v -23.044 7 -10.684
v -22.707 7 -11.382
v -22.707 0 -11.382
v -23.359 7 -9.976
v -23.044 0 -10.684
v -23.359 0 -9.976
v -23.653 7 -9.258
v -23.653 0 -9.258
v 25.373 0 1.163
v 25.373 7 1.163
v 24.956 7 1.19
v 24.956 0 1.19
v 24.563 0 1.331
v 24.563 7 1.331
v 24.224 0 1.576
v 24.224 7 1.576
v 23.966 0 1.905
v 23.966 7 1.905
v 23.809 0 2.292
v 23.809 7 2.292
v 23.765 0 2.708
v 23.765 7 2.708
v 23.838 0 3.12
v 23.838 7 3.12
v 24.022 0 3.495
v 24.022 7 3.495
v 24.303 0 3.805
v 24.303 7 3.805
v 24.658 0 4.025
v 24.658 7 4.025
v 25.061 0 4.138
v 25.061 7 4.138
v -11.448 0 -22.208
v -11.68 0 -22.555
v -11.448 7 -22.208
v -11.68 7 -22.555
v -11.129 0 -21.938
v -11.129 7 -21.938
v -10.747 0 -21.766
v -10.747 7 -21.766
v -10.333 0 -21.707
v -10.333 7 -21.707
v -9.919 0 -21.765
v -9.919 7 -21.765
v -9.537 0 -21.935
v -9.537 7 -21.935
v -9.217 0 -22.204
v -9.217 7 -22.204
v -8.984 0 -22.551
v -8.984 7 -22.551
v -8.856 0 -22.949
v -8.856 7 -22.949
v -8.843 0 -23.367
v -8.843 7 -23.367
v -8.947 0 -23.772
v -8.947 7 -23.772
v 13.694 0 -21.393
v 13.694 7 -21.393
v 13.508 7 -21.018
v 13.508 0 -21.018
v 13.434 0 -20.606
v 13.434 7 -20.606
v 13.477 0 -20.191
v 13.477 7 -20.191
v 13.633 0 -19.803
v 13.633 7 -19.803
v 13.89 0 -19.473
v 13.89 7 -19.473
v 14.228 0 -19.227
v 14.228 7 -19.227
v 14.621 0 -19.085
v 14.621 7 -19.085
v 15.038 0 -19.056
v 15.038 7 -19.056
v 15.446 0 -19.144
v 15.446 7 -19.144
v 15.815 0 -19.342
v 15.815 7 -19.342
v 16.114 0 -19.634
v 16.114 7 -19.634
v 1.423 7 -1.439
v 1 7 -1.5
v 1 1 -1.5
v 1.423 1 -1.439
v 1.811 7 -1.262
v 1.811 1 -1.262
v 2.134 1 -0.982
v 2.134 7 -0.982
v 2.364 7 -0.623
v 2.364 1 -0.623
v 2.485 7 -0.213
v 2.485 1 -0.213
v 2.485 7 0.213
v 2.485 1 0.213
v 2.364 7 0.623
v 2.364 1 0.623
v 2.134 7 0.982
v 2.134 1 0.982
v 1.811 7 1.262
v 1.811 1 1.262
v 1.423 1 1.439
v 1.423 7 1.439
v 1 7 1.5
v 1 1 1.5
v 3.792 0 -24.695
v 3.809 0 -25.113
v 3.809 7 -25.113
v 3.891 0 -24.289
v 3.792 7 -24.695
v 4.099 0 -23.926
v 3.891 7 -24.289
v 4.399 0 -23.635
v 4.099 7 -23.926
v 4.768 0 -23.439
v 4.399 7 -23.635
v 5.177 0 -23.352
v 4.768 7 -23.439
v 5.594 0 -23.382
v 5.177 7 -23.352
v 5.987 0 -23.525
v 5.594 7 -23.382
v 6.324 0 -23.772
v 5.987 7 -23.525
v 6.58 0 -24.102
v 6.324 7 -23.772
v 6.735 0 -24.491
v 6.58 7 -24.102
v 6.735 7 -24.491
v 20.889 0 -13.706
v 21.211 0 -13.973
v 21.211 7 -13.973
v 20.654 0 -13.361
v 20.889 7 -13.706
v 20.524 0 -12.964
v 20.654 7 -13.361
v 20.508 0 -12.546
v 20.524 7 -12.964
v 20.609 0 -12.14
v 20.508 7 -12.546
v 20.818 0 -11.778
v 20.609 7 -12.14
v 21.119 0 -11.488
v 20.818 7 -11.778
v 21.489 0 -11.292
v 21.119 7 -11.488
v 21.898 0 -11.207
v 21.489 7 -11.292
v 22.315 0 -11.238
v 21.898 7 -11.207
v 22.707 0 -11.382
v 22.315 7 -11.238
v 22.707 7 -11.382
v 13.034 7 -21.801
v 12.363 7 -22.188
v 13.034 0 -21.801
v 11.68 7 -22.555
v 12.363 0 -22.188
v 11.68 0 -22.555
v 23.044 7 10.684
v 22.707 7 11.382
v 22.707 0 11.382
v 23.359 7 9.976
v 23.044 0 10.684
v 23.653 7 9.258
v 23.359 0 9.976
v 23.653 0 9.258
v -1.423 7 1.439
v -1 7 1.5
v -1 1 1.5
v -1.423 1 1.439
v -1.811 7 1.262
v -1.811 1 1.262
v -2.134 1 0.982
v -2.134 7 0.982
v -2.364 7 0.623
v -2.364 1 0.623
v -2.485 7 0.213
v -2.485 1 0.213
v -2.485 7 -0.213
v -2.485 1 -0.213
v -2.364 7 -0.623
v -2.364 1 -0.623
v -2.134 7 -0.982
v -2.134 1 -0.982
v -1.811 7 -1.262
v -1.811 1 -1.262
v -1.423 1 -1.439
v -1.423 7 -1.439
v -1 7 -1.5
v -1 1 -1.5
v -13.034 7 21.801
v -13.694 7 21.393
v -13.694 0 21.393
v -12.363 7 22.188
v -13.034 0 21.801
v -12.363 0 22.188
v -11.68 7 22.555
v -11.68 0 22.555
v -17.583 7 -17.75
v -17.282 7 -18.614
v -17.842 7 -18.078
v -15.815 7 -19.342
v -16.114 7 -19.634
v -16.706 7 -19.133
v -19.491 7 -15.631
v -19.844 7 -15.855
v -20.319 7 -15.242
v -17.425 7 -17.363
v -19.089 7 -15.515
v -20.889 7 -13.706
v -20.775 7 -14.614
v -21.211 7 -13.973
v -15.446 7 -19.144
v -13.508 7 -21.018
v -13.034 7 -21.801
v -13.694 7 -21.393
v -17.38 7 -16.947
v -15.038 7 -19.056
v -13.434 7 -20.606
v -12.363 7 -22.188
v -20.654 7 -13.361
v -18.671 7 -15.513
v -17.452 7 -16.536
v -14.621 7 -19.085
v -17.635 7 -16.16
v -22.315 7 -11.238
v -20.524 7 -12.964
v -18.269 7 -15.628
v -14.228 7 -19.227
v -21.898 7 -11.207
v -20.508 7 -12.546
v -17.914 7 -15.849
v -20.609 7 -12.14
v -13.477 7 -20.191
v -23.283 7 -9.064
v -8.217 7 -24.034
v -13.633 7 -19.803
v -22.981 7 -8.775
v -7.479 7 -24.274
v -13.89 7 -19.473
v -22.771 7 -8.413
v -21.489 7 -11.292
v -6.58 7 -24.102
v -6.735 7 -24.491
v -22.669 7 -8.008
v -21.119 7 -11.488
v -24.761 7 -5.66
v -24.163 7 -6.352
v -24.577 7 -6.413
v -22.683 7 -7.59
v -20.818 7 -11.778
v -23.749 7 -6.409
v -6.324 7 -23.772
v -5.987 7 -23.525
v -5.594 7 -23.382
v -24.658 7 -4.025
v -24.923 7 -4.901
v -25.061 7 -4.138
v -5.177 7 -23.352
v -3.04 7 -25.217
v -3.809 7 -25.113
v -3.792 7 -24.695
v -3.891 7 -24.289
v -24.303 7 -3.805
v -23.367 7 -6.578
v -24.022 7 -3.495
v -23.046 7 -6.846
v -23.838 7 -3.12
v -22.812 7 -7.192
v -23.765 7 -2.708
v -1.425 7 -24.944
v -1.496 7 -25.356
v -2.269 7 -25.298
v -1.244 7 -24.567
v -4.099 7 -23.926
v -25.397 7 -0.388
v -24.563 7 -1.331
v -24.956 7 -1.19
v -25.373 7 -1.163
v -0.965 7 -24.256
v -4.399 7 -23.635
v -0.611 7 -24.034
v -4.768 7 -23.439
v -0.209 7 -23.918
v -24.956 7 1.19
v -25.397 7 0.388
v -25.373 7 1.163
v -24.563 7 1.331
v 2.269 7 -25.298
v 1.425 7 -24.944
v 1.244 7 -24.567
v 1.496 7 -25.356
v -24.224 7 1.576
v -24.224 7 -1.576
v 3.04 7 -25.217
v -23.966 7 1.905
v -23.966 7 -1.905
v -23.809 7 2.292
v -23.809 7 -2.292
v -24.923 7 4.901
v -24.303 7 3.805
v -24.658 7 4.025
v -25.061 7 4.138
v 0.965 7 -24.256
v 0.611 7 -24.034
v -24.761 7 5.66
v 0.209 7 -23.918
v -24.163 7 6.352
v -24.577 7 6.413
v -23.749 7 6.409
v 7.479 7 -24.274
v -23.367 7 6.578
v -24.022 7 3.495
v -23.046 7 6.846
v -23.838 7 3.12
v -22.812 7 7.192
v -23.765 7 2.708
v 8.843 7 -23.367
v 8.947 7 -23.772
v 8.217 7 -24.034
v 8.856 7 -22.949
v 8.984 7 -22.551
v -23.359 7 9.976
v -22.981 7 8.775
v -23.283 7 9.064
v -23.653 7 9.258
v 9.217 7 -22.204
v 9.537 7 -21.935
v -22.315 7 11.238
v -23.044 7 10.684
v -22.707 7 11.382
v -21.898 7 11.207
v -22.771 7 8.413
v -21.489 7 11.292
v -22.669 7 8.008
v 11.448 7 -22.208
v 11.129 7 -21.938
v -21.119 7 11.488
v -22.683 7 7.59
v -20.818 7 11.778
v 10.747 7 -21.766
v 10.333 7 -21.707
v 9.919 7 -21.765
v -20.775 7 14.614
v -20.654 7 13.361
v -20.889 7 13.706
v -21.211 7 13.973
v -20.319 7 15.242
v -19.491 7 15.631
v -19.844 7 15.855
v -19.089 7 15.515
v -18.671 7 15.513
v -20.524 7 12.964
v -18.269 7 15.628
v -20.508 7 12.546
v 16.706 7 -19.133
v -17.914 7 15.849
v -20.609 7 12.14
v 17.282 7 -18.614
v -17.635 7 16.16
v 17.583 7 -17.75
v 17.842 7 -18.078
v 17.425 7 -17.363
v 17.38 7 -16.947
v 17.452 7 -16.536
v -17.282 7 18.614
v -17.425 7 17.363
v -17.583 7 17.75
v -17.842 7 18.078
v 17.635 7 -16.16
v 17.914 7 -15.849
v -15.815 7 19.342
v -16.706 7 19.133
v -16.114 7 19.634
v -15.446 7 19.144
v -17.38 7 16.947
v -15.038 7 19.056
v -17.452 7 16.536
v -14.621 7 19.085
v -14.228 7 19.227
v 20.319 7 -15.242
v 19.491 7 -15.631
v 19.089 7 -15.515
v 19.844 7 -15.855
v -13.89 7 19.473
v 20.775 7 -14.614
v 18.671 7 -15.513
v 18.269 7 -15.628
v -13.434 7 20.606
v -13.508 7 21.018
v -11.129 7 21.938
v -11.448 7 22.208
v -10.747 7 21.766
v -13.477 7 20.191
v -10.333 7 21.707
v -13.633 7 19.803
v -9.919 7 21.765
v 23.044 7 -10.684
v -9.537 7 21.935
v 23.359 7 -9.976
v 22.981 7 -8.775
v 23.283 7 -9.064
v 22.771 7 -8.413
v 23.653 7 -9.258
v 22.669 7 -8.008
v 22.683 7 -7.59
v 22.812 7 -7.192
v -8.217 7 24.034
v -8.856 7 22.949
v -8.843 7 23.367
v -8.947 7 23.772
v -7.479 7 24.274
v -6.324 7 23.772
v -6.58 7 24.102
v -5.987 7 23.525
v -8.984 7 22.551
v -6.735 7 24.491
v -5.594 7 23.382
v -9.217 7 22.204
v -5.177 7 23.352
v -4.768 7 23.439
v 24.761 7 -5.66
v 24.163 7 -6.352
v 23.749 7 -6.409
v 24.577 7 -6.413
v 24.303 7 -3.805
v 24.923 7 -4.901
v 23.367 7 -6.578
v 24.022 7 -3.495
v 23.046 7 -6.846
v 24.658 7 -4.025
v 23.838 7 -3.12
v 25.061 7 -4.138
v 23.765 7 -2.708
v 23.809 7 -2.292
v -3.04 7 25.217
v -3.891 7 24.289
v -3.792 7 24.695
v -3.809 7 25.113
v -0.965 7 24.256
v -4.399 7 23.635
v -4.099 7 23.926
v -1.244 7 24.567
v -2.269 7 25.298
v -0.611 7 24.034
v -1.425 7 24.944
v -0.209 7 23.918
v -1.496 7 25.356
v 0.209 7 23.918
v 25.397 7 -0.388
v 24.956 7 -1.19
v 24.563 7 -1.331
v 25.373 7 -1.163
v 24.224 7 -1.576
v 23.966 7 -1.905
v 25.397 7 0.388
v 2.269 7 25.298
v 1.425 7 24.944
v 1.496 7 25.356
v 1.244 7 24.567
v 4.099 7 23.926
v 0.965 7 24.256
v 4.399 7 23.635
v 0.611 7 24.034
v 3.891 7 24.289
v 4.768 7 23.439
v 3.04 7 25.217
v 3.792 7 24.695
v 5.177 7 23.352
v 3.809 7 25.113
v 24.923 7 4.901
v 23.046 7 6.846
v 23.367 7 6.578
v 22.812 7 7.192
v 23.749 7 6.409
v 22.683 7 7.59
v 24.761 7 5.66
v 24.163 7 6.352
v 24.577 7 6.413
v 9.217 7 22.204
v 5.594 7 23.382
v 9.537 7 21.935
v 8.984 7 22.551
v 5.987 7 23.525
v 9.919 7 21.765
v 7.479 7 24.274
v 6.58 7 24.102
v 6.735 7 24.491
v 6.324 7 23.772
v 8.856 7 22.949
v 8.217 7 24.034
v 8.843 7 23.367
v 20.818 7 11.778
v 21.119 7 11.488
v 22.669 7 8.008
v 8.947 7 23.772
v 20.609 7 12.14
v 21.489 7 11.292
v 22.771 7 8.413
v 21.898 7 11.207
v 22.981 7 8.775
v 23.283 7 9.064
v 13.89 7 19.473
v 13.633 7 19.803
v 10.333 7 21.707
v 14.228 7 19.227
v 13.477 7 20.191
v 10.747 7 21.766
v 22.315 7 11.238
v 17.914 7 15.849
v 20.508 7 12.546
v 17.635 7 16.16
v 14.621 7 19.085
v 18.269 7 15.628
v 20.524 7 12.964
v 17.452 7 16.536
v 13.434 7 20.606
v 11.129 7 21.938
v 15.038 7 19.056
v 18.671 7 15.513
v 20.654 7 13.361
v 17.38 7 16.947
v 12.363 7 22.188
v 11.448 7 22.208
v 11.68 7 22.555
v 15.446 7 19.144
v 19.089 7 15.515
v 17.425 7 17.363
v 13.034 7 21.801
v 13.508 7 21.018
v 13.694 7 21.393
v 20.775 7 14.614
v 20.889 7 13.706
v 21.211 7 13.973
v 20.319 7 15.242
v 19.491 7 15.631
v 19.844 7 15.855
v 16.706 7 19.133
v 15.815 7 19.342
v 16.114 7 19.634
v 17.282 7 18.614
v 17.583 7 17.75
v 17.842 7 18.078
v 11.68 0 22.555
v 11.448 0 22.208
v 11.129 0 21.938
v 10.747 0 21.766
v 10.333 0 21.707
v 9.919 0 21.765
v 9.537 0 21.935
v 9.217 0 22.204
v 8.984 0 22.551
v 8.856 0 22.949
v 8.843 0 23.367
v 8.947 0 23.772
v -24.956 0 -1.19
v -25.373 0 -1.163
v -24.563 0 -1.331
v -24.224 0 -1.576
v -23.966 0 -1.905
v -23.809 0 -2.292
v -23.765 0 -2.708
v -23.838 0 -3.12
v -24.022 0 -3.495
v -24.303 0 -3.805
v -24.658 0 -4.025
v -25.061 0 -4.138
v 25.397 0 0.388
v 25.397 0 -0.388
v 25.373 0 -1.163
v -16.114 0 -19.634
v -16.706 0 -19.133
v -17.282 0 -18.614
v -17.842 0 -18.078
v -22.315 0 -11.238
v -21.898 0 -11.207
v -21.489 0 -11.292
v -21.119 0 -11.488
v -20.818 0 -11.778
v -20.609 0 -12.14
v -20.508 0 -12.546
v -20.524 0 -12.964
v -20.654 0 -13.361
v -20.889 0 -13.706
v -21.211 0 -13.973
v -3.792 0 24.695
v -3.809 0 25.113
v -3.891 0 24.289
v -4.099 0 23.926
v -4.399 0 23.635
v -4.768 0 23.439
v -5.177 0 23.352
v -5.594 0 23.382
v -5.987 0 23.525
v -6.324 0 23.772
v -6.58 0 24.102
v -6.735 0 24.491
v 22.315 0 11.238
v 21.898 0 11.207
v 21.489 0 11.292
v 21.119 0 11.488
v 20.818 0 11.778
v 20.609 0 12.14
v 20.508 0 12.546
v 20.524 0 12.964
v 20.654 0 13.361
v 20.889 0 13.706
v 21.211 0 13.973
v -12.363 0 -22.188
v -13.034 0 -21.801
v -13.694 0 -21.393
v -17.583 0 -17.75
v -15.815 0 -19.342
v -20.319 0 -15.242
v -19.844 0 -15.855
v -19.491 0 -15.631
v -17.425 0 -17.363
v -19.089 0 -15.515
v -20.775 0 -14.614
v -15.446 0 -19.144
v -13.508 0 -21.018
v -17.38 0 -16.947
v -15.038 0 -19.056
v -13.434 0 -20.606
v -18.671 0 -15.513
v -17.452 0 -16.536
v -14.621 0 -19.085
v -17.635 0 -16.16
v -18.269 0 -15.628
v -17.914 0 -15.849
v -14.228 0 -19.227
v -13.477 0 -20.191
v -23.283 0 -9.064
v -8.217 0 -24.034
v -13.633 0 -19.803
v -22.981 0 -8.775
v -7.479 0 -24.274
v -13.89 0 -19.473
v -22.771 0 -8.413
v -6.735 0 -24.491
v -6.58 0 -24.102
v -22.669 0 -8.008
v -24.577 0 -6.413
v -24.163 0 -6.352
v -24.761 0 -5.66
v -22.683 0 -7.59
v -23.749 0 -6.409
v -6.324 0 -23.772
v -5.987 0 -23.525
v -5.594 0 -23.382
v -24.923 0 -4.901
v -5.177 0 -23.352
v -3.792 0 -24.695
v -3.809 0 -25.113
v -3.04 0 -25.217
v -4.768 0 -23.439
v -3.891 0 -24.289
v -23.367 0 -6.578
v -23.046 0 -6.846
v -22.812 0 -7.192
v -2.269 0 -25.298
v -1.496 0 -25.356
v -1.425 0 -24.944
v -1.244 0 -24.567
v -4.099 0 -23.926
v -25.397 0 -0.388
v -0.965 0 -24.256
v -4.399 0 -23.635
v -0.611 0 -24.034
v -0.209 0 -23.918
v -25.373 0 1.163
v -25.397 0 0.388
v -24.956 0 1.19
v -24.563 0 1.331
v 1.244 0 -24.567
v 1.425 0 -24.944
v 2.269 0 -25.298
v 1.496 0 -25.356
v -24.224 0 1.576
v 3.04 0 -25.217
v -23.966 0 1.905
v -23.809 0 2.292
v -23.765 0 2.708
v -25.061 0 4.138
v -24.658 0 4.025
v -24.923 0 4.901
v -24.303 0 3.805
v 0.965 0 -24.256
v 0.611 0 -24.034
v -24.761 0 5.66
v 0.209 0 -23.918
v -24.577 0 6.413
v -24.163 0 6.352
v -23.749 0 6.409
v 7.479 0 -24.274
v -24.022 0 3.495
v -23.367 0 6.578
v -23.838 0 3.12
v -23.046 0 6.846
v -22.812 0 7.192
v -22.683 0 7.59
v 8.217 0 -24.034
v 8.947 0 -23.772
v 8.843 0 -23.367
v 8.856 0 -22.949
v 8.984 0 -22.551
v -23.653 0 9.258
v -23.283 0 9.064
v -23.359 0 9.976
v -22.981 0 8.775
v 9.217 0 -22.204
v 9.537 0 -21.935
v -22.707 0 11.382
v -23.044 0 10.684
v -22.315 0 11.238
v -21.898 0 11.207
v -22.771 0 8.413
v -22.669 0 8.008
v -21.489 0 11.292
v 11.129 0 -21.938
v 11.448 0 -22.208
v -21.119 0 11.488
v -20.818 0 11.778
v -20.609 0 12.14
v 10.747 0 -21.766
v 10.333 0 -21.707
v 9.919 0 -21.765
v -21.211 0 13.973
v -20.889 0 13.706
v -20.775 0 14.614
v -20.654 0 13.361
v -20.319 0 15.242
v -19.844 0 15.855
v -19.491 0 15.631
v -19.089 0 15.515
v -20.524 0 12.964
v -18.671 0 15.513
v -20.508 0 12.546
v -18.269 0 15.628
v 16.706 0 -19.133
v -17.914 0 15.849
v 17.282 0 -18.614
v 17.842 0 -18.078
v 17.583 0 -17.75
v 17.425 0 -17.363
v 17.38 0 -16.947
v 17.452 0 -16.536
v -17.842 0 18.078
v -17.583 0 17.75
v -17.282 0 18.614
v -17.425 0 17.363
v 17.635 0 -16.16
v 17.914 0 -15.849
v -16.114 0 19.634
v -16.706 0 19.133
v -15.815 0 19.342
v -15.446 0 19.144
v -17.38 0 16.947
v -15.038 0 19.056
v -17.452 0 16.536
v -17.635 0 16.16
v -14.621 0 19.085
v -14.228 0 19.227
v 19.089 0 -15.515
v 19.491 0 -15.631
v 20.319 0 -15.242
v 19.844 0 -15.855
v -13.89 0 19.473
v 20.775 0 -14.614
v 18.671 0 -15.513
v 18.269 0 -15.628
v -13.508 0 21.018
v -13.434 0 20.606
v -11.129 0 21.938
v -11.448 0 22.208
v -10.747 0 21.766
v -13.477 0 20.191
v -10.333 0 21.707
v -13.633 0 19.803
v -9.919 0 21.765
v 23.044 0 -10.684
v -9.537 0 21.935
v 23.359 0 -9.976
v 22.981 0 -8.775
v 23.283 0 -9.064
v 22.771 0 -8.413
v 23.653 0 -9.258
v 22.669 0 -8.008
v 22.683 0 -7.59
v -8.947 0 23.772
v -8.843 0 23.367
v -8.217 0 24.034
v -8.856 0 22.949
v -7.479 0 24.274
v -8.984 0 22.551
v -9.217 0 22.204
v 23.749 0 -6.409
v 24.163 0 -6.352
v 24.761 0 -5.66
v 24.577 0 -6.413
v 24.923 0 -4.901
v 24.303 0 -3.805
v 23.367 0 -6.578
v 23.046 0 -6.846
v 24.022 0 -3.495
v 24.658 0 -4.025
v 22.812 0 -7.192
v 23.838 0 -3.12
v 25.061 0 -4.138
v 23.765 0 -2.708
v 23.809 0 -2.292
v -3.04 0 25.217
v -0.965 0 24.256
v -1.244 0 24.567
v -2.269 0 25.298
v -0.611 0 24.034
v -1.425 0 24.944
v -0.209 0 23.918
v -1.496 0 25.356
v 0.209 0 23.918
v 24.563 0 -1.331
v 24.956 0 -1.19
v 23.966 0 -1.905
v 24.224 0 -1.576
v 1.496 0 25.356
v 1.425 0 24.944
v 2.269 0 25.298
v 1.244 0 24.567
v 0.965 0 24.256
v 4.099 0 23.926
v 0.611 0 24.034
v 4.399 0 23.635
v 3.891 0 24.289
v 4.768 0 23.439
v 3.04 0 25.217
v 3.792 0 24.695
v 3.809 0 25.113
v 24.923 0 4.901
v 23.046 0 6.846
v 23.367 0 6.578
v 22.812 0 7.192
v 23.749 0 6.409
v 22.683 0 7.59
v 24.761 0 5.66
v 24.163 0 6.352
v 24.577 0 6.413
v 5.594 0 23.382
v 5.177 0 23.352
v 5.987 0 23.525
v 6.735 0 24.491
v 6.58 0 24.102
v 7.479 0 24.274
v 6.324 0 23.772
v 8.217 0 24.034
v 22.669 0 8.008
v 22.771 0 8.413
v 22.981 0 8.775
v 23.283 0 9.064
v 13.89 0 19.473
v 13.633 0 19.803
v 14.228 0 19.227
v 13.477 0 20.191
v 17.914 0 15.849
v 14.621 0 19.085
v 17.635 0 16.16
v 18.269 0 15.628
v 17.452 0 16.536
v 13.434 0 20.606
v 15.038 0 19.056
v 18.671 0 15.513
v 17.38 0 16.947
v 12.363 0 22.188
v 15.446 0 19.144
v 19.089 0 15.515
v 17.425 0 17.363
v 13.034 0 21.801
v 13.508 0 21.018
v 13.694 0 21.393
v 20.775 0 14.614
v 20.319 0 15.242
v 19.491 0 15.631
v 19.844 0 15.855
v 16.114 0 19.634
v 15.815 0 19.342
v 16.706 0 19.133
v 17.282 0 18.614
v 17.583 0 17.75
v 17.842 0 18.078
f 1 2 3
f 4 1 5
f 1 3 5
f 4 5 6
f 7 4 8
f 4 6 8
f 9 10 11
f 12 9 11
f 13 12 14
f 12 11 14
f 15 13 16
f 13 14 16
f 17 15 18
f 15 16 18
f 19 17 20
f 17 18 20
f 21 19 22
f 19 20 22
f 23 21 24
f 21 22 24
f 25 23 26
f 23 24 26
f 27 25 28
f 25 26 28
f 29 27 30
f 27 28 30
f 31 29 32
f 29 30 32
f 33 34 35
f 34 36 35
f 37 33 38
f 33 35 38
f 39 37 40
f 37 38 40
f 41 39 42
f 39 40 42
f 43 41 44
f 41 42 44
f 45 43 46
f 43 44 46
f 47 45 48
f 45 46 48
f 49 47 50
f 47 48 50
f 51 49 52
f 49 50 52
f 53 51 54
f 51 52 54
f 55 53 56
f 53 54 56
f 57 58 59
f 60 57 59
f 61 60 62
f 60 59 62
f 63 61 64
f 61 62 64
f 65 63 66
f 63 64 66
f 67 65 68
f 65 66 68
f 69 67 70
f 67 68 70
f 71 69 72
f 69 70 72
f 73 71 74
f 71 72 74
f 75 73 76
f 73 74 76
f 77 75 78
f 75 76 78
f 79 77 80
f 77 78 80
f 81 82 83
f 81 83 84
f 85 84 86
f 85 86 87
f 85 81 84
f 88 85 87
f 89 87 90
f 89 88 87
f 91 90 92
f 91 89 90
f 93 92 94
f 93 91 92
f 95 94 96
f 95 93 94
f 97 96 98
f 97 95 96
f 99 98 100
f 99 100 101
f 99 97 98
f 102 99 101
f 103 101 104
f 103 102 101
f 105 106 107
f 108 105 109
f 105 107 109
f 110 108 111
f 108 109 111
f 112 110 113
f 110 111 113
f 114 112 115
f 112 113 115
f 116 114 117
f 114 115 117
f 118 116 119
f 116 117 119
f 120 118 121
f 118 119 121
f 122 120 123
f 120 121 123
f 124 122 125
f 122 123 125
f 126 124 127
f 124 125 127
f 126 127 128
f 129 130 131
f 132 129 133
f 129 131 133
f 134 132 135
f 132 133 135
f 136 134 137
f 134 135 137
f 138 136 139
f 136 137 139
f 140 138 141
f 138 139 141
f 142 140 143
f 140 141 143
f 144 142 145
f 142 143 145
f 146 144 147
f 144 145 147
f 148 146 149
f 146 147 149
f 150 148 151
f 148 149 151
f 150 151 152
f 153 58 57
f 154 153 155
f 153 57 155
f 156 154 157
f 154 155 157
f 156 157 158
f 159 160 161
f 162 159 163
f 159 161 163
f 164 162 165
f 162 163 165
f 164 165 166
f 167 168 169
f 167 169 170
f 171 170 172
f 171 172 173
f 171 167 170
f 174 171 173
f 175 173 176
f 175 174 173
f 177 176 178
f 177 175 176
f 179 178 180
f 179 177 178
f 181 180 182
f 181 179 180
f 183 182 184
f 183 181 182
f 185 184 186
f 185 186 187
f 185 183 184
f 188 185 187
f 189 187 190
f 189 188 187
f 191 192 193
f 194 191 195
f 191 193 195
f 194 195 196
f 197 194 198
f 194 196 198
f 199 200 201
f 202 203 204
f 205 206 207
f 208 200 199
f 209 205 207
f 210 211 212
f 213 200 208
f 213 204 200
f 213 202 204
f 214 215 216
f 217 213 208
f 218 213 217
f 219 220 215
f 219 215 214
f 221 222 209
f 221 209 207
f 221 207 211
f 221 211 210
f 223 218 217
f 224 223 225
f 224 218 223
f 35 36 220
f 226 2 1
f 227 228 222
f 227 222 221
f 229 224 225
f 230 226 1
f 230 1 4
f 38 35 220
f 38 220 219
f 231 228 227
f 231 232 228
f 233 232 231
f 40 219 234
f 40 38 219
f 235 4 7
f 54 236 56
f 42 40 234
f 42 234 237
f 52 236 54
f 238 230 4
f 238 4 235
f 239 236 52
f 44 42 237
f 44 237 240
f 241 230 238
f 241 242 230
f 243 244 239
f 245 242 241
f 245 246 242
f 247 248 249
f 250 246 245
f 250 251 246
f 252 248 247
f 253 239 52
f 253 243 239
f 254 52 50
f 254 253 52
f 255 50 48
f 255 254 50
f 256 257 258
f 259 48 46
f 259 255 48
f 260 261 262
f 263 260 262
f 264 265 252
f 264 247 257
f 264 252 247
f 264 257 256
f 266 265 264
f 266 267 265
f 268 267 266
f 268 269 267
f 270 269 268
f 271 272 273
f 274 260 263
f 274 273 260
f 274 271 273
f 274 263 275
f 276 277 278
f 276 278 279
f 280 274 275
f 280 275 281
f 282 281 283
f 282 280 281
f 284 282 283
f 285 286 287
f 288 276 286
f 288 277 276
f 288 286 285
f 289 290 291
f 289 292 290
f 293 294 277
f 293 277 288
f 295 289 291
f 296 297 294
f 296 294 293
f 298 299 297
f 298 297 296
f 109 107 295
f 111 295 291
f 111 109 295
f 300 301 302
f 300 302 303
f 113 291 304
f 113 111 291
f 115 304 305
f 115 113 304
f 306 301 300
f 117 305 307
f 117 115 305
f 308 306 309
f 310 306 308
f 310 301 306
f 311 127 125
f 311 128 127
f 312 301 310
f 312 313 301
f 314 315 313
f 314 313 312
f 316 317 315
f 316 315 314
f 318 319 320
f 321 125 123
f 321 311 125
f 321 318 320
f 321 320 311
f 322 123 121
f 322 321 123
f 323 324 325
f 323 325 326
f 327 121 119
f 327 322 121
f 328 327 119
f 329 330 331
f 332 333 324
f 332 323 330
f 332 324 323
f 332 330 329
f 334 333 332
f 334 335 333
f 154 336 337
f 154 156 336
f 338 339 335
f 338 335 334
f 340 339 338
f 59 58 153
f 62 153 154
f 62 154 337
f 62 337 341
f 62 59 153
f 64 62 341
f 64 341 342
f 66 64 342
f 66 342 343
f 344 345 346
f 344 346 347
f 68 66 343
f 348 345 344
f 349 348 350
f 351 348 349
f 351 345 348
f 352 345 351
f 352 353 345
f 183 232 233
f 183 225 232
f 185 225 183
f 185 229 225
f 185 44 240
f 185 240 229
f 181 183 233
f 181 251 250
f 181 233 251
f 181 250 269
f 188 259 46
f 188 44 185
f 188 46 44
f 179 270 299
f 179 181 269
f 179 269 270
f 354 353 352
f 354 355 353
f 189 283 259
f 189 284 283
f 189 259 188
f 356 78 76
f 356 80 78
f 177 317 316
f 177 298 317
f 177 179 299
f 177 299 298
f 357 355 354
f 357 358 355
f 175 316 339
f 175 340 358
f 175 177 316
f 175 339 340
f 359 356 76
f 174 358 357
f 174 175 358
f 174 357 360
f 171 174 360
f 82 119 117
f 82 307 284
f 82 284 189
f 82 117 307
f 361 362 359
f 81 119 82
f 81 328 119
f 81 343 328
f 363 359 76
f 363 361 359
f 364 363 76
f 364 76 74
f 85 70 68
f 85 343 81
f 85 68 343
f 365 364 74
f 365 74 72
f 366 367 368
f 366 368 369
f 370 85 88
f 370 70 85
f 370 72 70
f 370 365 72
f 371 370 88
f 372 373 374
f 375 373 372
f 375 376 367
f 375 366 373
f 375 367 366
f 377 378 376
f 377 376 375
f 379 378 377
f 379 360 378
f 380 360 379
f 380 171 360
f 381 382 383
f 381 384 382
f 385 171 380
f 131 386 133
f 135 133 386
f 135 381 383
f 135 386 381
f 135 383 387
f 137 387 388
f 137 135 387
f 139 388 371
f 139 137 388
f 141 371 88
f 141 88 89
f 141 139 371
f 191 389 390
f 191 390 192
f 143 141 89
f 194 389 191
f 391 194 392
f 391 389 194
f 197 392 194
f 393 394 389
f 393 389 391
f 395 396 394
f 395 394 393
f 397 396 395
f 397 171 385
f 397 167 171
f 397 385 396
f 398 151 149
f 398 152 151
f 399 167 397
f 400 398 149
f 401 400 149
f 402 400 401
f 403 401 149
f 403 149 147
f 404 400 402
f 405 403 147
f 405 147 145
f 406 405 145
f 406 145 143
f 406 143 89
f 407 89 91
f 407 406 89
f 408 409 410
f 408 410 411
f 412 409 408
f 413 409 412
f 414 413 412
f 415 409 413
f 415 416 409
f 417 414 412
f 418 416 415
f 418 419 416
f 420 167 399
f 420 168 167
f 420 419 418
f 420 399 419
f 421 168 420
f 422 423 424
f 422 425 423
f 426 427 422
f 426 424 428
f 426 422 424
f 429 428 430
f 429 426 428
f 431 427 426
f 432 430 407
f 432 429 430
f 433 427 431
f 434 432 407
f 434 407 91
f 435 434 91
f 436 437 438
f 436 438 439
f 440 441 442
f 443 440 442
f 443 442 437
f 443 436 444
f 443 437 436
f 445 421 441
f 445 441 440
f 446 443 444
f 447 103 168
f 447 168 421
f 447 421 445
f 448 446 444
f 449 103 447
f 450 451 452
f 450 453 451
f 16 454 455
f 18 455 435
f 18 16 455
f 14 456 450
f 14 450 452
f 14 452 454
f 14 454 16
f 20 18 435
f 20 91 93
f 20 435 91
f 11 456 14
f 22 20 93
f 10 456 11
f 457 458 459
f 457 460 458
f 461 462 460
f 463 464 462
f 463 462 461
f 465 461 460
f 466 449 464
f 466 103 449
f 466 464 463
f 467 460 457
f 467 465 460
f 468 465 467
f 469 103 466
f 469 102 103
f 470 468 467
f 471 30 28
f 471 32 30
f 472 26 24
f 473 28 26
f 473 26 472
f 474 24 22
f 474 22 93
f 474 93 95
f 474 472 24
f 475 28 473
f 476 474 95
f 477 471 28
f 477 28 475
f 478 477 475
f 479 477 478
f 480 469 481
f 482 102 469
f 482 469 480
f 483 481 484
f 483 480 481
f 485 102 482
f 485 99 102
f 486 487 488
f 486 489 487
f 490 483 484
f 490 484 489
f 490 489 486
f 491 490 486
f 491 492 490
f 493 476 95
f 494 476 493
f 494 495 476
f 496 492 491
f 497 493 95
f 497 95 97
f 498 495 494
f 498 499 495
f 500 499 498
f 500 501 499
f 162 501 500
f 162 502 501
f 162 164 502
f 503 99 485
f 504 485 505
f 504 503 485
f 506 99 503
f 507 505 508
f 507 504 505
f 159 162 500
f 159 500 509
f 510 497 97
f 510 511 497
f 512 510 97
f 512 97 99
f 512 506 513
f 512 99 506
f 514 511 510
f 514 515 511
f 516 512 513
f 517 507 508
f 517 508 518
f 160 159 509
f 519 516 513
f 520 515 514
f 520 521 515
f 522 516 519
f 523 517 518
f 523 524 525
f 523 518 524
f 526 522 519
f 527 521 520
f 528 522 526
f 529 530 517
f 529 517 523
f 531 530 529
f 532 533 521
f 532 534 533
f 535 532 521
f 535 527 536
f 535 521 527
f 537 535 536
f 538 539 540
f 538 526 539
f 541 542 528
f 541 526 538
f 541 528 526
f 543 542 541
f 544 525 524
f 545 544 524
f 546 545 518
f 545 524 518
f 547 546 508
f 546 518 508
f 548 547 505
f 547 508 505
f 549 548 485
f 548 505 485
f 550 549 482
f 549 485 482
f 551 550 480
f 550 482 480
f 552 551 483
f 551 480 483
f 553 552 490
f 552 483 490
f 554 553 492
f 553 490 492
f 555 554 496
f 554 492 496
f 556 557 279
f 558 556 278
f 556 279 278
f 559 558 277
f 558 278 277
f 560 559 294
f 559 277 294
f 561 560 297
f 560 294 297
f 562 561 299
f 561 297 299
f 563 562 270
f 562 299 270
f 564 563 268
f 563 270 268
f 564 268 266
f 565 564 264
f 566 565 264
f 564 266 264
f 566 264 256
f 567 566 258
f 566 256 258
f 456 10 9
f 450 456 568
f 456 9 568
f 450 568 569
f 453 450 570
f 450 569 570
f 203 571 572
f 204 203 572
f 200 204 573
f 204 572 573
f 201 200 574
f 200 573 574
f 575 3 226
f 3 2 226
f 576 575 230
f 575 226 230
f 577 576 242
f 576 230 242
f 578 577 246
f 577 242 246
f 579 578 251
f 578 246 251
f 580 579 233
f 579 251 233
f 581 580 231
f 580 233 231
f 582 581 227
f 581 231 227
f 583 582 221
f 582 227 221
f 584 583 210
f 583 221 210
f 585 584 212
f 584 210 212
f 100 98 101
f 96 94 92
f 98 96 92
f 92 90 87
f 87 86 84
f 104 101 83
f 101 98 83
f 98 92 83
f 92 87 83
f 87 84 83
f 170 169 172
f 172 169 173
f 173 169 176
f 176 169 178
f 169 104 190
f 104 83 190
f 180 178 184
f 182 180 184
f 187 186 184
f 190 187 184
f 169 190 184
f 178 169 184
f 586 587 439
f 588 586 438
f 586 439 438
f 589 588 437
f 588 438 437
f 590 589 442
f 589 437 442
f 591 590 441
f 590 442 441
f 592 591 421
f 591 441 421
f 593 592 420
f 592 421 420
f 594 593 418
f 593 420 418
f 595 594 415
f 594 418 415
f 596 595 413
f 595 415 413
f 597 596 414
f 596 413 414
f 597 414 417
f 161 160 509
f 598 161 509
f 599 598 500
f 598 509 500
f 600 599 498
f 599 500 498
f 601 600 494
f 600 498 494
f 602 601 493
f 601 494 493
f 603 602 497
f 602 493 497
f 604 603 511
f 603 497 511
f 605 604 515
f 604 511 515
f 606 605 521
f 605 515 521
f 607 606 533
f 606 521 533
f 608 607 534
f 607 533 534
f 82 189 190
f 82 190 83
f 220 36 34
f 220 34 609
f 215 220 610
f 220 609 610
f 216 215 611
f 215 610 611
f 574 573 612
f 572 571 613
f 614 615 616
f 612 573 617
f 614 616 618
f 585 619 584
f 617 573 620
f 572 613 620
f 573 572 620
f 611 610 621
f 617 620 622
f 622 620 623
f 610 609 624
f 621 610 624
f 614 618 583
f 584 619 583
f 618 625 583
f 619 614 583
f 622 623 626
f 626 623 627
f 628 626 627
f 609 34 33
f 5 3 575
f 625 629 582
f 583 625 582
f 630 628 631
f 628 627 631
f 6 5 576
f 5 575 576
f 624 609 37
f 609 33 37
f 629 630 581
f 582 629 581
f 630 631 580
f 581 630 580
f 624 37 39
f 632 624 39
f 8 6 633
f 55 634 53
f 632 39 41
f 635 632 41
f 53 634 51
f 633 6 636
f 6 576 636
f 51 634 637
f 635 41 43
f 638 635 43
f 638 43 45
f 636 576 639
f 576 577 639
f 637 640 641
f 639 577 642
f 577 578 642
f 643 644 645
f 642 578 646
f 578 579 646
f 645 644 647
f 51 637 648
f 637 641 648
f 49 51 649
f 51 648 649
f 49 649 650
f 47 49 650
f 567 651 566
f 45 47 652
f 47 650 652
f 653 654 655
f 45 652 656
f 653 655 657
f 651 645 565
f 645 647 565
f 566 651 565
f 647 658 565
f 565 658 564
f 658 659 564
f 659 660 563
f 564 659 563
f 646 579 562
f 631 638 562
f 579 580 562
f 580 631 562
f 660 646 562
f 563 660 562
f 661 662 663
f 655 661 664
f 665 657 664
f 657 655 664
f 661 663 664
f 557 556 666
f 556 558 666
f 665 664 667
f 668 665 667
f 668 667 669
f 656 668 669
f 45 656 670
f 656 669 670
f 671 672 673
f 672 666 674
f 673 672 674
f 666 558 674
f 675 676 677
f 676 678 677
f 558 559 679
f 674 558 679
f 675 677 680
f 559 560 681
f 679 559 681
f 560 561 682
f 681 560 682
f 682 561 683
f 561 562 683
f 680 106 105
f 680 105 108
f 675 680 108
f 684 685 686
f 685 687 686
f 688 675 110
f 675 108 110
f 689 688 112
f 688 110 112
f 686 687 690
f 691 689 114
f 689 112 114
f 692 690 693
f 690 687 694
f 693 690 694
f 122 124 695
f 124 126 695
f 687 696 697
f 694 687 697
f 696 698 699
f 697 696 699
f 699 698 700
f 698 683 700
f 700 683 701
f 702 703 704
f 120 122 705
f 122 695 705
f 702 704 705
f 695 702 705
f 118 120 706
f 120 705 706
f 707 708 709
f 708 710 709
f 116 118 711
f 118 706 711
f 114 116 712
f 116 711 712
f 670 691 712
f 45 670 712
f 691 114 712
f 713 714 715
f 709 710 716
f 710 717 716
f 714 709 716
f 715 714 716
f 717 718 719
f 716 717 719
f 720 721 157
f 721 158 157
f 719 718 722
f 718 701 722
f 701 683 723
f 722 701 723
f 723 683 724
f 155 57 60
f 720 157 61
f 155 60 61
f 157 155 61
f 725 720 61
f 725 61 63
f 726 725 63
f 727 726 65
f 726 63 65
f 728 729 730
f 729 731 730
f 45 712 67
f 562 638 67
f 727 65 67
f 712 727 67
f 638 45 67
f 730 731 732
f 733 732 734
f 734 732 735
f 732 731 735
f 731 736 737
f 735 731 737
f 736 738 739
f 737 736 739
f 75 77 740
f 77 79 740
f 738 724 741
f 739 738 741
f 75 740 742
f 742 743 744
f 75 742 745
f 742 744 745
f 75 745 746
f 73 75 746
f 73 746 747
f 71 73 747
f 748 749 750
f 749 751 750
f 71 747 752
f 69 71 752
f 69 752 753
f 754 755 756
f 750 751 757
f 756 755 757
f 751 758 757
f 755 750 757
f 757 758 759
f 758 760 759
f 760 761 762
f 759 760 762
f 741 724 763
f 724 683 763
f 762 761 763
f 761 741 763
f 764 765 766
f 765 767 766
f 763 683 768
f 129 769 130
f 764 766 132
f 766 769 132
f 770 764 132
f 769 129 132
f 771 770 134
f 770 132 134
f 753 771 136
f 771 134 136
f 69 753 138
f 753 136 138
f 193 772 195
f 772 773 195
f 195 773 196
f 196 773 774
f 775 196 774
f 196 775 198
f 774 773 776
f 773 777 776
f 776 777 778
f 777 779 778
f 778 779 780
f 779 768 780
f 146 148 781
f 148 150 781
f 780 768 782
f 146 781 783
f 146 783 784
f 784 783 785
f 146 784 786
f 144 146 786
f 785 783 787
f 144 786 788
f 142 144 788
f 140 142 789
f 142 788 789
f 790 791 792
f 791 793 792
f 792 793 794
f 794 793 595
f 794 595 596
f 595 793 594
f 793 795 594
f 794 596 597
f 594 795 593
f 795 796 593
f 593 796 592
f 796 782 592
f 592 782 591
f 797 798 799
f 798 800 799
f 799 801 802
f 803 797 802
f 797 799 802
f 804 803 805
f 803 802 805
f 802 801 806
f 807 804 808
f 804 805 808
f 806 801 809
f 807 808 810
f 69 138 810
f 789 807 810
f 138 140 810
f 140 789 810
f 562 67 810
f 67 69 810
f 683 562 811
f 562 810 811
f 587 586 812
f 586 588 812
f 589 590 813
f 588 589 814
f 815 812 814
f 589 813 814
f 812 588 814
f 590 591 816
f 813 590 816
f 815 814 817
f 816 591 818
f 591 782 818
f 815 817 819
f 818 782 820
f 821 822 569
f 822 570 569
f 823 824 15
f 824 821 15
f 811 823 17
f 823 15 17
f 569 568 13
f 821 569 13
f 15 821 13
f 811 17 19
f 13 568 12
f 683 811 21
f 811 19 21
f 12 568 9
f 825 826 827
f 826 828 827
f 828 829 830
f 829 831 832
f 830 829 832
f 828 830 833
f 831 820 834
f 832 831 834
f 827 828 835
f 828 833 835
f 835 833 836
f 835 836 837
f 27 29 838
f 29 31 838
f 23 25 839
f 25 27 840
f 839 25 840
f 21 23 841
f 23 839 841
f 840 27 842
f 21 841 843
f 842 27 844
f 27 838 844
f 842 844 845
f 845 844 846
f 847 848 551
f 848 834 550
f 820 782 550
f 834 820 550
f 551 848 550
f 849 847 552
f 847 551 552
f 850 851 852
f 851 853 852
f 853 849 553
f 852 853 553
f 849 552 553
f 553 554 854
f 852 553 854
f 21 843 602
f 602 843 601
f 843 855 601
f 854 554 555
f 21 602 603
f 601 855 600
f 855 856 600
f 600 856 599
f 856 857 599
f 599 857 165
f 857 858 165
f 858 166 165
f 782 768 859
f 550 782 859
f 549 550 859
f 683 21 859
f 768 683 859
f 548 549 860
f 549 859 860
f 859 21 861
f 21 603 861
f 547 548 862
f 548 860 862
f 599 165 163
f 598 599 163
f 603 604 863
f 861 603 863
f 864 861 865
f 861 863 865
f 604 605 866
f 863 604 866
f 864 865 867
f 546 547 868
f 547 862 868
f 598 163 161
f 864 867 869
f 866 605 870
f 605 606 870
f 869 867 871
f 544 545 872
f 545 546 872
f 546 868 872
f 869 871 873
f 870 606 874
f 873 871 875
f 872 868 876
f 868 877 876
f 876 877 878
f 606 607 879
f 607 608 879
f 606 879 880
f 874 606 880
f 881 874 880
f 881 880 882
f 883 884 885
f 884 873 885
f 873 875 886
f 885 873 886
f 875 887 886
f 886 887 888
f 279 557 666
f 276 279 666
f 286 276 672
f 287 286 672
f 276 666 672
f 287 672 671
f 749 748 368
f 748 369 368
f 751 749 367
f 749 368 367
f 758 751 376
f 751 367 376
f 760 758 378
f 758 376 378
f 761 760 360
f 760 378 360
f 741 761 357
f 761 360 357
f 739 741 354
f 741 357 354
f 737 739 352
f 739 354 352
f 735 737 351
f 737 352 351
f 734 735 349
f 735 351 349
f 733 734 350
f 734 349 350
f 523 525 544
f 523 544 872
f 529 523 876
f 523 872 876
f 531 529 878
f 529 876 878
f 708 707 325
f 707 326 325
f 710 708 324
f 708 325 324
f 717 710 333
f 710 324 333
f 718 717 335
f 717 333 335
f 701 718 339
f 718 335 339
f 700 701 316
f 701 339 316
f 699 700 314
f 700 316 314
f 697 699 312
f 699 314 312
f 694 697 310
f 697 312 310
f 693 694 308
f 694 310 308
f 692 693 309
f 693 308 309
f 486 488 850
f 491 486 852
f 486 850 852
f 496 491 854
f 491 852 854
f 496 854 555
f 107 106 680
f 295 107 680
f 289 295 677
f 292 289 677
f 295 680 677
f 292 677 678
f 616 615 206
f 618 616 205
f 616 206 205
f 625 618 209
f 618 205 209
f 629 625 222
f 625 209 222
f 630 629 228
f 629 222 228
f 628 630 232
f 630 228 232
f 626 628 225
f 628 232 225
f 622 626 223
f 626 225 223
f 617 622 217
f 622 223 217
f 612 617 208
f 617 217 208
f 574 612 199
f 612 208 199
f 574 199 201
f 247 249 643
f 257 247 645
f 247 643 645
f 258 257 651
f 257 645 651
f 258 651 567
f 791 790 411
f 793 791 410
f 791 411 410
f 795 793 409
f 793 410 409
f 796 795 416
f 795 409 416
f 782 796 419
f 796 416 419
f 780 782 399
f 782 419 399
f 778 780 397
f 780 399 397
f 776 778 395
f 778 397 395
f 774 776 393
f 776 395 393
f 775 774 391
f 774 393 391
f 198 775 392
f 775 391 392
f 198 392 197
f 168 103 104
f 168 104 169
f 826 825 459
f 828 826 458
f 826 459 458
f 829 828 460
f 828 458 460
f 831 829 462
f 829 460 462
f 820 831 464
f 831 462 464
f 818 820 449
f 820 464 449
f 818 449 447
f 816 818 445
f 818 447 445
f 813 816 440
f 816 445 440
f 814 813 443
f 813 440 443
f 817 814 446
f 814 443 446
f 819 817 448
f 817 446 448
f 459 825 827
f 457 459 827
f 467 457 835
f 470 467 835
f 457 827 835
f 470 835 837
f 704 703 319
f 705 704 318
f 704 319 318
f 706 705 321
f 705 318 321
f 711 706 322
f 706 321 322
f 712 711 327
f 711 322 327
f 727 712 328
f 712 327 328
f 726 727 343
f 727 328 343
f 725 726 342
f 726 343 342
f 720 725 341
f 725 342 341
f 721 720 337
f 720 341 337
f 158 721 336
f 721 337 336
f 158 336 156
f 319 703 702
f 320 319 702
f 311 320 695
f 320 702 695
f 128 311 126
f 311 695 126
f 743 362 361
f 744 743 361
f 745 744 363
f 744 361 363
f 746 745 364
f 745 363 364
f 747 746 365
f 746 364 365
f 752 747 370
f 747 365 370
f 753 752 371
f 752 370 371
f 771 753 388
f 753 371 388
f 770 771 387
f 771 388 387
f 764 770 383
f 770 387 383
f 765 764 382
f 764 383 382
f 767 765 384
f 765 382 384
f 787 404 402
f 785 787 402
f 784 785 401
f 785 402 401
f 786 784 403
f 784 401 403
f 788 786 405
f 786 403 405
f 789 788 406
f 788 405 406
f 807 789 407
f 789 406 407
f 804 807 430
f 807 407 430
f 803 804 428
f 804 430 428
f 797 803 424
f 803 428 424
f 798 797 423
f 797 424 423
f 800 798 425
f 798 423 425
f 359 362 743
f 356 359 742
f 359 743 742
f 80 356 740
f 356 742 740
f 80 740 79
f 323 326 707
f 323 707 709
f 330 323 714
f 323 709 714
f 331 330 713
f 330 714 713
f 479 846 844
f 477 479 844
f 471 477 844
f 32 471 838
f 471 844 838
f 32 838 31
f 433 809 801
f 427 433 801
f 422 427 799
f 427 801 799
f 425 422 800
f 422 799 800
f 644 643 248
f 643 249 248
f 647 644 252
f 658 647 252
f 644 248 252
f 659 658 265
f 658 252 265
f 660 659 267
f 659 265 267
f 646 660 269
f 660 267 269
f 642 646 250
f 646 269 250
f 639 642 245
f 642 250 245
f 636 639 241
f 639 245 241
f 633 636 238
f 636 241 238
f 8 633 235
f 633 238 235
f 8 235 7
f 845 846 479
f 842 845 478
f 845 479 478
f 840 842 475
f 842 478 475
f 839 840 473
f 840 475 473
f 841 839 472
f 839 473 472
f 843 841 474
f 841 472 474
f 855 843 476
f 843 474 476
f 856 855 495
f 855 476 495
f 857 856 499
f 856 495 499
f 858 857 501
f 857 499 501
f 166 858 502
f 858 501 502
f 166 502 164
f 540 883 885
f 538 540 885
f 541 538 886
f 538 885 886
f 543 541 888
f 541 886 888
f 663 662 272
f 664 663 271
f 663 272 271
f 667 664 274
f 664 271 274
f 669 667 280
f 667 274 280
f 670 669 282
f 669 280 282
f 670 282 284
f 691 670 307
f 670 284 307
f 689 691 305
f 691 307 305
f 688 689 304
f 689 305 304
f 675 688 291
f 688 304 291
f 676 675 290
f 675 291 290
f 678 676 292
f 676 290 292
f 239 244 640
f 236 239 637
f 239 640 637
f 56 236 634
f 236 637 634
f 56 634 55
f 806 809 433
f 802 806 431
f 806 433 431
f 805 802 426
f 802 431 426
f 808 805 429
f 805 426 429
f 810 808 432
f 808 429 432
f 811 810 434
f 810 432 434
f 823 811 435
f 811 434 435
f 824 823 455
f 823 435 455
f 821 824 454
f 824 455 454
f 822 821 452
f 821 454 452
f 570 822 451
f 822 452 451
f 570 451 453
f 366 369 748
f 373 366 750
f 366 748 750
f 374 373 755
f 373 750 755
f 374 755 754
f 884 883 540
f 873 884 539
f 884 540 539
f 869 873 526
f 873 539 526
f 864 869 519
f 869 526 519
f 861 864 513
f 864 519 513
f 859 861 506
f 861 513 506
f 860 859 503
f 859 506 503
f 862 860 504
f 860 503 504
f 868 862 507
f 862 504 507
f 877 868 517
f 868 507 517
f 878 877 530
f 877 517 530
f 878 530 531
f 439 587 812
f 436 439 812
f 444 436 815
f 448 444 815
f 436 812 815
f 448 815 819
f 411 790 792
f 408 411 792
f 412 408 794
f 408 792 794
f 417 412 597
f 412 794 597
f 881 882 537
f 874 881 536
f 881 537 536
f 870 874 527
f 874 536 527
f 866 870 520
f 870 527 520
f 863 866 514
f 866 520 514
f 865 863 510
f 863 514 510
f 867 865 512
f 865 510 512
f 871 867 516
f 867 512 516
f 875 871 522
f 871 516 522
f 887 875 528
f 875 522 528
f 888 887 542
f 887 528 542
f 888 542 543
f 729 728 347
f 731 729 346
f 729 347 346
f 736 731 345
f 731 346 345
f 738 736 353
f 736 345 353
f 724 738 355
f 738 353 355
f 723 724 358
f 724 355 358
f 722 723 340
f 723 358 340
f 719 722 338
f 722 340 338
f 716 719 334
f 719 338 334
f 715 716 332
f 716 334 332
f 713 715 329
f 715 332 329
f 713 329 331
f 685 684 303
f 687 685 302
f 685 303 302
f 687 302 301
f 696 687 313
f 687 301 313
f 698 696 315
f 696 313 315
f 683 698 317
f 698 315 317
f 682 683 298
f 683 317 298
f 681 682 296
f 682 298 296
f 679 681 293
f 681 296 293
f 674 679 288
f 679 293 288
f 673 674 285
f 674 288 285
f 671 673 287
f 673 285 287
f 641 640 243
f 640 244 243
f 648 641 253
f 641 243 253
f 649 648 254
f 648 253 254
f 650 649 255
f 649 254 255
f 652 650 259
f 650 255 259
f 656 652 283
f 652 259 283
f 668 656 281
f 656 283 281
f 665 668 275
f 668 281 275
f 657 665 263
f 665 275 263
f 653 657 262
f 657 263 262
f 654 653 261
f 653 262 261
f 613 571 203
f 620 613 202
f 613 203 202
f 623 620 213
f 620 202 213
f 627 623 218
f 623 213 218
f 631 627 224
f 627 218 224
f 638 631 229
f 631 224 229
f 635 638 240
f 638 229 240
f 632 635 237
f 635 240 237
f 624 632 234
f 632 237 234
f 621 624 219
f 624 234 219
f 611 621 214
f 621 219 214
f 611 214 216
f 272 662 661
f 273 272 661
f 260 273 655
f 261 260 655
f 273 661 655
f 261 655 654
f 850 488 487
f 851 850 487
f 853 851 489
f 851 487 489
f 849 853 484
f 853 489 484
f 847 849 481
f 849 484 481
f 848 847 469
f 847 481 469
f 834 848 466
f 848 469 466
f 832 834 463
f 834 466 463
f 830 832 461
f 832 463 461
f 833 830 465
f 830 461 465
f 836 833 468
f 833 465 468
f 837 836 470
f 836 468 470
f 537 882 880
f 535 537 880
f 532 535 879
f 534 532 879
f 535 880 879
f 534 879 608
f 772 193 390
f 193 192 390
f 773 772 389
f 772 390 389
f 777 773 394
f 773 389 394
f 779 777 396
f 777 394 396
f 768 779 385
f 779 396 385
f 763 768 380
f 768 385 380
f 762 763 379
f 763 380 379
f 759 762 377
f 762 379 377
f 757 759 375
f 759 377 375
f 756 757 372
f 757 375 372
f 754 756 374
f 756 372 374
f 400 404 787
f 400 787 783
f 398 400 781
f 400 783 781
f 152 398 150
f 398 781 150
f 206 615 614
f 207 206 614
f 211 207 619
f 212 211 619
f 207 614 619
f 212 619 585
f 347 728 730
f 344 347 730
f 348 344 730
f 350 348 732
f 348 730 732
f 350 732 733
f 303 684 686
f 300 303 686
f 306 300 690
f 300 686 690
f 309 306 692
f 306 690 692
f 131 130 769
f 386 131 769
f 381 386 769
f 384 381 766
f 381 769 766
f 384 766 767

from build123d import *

# Parameters (mm, degrees)
SKETCH1_R           = 25.4
BOSS_EXTRUDE1_DEPTH = 7
CUT_EXTRUDE1_DEPTH  = 6
SKETCH4_R           = 1.496602071
CUT_EXTRUDE2_DEPTH  = 37.596721165


with BuildPart() as part:
    # Sketch1 → Boss-Extrude1 (new body)
    with BuildSketch(Plane(origin=(0, 0, 0), x_dir=(1, 0, 0), z_dir=(0, 1, 0))):
        with Locations(Location((0, 0, 0), (0, 0, 270))):
            Circle(SKETCH1_R)
    extrude(amount=BOSS_EXTRUDE1_DEPTH)

    # Sketch3 → Cut-Extrude1 (cut)
    with BuildSketch(Plane(origin=(0, 7, 0), x_dir=(1, 0, 0), z_dir=(0, 1, 0))):
        with BuildLine():
            Line((-1, 1.5), (1, 1.5))
            ThreePointArc((1, 1.5), (2.5, 0), (1, -1.5))
            Line((1, -1.5), (-1, -1.5))
            ThreePointArc((-1, -1.5), (-2.5, 0), (-1, 1.5))
        make_face()
    extrude(amount=-CUT_EXTRUDE1_DEPTH, mode=Mode.SUBTRACT)

    # Sketch4 → Cut-Extrude2 (cut, through all)
    with BuildSketch(Plane(origin=(0, 7, 0), x_dir=(1, 0, 0), z_dir=(0, 1, 0))):
        with Locations((0, 25.4)):
            Circle(SKETCH4_R)
        with Locations((5.280956947, 24.844949059)):
            Circle(SKETCH4_R)
        with Locations((10.331110734, 23.204054624)):
            Circle(SKETCH4_R)
        with Locations((14.929745408, 20.549031657)):
            Circle(SKETCH4_R)
        with Locations((18.875878567, 16.995917402)):
            Circle(SKETCH4_R)
        with Locations((21.997045256, 12.7)):
            Circle(SKETCH4_R)
        with Locations((24.156835514, 7.849031657)):
            Circle(SKETCH4_R)
        with Locations((25.260856142, 2.655022967)):
            Circle(SKETCH4_R)
        with Locations((25.260856142, -2.655022967)):
            Circle(SKETCH4_R)
        with Locations((24.156835514, -7.849031657)):
            Circle(SKETCH4_R)
        with Locations((21.997045256, -12.7)):
            Circle(SKETCH4_R)
        with Locations((18.875878567, -16.995917402)):
            Circle(SKETCH4_R)
        with Locations((14.929745408, -20.549031657)):
            Circle(SKETCH4_R)
        with Locations((10.331110734, -23.204054624)):
            Circle(SKETCH4_R)
        with Locations((5.280956947, -24.844949059)):
            Circle(SKETCH4_R)
        with Locations((0, -25.4)):
            Circle(SKETCH4_R)
        with Locations((-5.280956947, -24.844949059)):
            Circle(SKETCH4_R)
        with Locations((-10.331110734, -23.204054624)):
            Circle(SKETCH4_R)
        with Locations((-14.929745408, -20.549031657)):
            Circle(SKETCH4_R)
        with Locations((-18.875878567, -16.995917402)):
            Circle(SKETCH4_R)
        with Locations((-21.997045256, -12.7)):
            Circle(SKETCH4_R)
        with Locations((-24.156835514, -7.849031657)):
            Circle(SKETCH4_R)
        with Locations((-25.260856142, -2.655022967)):
            Circle(SKETCH4_R)
        with Locations((-25.260856142, 2.655022967)):
            Circle(SKETCH4_R)
        with Locations((-24.156835514, 7.849031657)):
            Circle(SKETCH4_R)
        with Locations((-21.997045256, 12.7)):
            Circle(SKETCH4_R)
        with Locations((-18.875878567, 16.995917402)):
            Circle(SKETCH4_R)
        with Locations((-14.929745408, 20.549031657)):
            Circle(SKETCH4_R)
        with Locations((-10.331110734, 23.204054624)):
            Circle(SKETCH4_R)
        with Locations((-5.280956947, 24.844949059)):
            Circle(SKETCH4_R)
    extrude(amount=-CUT_EXTRUDE2_DEPTH, mode=Mode.SUBTRACT)


solid = part.part
